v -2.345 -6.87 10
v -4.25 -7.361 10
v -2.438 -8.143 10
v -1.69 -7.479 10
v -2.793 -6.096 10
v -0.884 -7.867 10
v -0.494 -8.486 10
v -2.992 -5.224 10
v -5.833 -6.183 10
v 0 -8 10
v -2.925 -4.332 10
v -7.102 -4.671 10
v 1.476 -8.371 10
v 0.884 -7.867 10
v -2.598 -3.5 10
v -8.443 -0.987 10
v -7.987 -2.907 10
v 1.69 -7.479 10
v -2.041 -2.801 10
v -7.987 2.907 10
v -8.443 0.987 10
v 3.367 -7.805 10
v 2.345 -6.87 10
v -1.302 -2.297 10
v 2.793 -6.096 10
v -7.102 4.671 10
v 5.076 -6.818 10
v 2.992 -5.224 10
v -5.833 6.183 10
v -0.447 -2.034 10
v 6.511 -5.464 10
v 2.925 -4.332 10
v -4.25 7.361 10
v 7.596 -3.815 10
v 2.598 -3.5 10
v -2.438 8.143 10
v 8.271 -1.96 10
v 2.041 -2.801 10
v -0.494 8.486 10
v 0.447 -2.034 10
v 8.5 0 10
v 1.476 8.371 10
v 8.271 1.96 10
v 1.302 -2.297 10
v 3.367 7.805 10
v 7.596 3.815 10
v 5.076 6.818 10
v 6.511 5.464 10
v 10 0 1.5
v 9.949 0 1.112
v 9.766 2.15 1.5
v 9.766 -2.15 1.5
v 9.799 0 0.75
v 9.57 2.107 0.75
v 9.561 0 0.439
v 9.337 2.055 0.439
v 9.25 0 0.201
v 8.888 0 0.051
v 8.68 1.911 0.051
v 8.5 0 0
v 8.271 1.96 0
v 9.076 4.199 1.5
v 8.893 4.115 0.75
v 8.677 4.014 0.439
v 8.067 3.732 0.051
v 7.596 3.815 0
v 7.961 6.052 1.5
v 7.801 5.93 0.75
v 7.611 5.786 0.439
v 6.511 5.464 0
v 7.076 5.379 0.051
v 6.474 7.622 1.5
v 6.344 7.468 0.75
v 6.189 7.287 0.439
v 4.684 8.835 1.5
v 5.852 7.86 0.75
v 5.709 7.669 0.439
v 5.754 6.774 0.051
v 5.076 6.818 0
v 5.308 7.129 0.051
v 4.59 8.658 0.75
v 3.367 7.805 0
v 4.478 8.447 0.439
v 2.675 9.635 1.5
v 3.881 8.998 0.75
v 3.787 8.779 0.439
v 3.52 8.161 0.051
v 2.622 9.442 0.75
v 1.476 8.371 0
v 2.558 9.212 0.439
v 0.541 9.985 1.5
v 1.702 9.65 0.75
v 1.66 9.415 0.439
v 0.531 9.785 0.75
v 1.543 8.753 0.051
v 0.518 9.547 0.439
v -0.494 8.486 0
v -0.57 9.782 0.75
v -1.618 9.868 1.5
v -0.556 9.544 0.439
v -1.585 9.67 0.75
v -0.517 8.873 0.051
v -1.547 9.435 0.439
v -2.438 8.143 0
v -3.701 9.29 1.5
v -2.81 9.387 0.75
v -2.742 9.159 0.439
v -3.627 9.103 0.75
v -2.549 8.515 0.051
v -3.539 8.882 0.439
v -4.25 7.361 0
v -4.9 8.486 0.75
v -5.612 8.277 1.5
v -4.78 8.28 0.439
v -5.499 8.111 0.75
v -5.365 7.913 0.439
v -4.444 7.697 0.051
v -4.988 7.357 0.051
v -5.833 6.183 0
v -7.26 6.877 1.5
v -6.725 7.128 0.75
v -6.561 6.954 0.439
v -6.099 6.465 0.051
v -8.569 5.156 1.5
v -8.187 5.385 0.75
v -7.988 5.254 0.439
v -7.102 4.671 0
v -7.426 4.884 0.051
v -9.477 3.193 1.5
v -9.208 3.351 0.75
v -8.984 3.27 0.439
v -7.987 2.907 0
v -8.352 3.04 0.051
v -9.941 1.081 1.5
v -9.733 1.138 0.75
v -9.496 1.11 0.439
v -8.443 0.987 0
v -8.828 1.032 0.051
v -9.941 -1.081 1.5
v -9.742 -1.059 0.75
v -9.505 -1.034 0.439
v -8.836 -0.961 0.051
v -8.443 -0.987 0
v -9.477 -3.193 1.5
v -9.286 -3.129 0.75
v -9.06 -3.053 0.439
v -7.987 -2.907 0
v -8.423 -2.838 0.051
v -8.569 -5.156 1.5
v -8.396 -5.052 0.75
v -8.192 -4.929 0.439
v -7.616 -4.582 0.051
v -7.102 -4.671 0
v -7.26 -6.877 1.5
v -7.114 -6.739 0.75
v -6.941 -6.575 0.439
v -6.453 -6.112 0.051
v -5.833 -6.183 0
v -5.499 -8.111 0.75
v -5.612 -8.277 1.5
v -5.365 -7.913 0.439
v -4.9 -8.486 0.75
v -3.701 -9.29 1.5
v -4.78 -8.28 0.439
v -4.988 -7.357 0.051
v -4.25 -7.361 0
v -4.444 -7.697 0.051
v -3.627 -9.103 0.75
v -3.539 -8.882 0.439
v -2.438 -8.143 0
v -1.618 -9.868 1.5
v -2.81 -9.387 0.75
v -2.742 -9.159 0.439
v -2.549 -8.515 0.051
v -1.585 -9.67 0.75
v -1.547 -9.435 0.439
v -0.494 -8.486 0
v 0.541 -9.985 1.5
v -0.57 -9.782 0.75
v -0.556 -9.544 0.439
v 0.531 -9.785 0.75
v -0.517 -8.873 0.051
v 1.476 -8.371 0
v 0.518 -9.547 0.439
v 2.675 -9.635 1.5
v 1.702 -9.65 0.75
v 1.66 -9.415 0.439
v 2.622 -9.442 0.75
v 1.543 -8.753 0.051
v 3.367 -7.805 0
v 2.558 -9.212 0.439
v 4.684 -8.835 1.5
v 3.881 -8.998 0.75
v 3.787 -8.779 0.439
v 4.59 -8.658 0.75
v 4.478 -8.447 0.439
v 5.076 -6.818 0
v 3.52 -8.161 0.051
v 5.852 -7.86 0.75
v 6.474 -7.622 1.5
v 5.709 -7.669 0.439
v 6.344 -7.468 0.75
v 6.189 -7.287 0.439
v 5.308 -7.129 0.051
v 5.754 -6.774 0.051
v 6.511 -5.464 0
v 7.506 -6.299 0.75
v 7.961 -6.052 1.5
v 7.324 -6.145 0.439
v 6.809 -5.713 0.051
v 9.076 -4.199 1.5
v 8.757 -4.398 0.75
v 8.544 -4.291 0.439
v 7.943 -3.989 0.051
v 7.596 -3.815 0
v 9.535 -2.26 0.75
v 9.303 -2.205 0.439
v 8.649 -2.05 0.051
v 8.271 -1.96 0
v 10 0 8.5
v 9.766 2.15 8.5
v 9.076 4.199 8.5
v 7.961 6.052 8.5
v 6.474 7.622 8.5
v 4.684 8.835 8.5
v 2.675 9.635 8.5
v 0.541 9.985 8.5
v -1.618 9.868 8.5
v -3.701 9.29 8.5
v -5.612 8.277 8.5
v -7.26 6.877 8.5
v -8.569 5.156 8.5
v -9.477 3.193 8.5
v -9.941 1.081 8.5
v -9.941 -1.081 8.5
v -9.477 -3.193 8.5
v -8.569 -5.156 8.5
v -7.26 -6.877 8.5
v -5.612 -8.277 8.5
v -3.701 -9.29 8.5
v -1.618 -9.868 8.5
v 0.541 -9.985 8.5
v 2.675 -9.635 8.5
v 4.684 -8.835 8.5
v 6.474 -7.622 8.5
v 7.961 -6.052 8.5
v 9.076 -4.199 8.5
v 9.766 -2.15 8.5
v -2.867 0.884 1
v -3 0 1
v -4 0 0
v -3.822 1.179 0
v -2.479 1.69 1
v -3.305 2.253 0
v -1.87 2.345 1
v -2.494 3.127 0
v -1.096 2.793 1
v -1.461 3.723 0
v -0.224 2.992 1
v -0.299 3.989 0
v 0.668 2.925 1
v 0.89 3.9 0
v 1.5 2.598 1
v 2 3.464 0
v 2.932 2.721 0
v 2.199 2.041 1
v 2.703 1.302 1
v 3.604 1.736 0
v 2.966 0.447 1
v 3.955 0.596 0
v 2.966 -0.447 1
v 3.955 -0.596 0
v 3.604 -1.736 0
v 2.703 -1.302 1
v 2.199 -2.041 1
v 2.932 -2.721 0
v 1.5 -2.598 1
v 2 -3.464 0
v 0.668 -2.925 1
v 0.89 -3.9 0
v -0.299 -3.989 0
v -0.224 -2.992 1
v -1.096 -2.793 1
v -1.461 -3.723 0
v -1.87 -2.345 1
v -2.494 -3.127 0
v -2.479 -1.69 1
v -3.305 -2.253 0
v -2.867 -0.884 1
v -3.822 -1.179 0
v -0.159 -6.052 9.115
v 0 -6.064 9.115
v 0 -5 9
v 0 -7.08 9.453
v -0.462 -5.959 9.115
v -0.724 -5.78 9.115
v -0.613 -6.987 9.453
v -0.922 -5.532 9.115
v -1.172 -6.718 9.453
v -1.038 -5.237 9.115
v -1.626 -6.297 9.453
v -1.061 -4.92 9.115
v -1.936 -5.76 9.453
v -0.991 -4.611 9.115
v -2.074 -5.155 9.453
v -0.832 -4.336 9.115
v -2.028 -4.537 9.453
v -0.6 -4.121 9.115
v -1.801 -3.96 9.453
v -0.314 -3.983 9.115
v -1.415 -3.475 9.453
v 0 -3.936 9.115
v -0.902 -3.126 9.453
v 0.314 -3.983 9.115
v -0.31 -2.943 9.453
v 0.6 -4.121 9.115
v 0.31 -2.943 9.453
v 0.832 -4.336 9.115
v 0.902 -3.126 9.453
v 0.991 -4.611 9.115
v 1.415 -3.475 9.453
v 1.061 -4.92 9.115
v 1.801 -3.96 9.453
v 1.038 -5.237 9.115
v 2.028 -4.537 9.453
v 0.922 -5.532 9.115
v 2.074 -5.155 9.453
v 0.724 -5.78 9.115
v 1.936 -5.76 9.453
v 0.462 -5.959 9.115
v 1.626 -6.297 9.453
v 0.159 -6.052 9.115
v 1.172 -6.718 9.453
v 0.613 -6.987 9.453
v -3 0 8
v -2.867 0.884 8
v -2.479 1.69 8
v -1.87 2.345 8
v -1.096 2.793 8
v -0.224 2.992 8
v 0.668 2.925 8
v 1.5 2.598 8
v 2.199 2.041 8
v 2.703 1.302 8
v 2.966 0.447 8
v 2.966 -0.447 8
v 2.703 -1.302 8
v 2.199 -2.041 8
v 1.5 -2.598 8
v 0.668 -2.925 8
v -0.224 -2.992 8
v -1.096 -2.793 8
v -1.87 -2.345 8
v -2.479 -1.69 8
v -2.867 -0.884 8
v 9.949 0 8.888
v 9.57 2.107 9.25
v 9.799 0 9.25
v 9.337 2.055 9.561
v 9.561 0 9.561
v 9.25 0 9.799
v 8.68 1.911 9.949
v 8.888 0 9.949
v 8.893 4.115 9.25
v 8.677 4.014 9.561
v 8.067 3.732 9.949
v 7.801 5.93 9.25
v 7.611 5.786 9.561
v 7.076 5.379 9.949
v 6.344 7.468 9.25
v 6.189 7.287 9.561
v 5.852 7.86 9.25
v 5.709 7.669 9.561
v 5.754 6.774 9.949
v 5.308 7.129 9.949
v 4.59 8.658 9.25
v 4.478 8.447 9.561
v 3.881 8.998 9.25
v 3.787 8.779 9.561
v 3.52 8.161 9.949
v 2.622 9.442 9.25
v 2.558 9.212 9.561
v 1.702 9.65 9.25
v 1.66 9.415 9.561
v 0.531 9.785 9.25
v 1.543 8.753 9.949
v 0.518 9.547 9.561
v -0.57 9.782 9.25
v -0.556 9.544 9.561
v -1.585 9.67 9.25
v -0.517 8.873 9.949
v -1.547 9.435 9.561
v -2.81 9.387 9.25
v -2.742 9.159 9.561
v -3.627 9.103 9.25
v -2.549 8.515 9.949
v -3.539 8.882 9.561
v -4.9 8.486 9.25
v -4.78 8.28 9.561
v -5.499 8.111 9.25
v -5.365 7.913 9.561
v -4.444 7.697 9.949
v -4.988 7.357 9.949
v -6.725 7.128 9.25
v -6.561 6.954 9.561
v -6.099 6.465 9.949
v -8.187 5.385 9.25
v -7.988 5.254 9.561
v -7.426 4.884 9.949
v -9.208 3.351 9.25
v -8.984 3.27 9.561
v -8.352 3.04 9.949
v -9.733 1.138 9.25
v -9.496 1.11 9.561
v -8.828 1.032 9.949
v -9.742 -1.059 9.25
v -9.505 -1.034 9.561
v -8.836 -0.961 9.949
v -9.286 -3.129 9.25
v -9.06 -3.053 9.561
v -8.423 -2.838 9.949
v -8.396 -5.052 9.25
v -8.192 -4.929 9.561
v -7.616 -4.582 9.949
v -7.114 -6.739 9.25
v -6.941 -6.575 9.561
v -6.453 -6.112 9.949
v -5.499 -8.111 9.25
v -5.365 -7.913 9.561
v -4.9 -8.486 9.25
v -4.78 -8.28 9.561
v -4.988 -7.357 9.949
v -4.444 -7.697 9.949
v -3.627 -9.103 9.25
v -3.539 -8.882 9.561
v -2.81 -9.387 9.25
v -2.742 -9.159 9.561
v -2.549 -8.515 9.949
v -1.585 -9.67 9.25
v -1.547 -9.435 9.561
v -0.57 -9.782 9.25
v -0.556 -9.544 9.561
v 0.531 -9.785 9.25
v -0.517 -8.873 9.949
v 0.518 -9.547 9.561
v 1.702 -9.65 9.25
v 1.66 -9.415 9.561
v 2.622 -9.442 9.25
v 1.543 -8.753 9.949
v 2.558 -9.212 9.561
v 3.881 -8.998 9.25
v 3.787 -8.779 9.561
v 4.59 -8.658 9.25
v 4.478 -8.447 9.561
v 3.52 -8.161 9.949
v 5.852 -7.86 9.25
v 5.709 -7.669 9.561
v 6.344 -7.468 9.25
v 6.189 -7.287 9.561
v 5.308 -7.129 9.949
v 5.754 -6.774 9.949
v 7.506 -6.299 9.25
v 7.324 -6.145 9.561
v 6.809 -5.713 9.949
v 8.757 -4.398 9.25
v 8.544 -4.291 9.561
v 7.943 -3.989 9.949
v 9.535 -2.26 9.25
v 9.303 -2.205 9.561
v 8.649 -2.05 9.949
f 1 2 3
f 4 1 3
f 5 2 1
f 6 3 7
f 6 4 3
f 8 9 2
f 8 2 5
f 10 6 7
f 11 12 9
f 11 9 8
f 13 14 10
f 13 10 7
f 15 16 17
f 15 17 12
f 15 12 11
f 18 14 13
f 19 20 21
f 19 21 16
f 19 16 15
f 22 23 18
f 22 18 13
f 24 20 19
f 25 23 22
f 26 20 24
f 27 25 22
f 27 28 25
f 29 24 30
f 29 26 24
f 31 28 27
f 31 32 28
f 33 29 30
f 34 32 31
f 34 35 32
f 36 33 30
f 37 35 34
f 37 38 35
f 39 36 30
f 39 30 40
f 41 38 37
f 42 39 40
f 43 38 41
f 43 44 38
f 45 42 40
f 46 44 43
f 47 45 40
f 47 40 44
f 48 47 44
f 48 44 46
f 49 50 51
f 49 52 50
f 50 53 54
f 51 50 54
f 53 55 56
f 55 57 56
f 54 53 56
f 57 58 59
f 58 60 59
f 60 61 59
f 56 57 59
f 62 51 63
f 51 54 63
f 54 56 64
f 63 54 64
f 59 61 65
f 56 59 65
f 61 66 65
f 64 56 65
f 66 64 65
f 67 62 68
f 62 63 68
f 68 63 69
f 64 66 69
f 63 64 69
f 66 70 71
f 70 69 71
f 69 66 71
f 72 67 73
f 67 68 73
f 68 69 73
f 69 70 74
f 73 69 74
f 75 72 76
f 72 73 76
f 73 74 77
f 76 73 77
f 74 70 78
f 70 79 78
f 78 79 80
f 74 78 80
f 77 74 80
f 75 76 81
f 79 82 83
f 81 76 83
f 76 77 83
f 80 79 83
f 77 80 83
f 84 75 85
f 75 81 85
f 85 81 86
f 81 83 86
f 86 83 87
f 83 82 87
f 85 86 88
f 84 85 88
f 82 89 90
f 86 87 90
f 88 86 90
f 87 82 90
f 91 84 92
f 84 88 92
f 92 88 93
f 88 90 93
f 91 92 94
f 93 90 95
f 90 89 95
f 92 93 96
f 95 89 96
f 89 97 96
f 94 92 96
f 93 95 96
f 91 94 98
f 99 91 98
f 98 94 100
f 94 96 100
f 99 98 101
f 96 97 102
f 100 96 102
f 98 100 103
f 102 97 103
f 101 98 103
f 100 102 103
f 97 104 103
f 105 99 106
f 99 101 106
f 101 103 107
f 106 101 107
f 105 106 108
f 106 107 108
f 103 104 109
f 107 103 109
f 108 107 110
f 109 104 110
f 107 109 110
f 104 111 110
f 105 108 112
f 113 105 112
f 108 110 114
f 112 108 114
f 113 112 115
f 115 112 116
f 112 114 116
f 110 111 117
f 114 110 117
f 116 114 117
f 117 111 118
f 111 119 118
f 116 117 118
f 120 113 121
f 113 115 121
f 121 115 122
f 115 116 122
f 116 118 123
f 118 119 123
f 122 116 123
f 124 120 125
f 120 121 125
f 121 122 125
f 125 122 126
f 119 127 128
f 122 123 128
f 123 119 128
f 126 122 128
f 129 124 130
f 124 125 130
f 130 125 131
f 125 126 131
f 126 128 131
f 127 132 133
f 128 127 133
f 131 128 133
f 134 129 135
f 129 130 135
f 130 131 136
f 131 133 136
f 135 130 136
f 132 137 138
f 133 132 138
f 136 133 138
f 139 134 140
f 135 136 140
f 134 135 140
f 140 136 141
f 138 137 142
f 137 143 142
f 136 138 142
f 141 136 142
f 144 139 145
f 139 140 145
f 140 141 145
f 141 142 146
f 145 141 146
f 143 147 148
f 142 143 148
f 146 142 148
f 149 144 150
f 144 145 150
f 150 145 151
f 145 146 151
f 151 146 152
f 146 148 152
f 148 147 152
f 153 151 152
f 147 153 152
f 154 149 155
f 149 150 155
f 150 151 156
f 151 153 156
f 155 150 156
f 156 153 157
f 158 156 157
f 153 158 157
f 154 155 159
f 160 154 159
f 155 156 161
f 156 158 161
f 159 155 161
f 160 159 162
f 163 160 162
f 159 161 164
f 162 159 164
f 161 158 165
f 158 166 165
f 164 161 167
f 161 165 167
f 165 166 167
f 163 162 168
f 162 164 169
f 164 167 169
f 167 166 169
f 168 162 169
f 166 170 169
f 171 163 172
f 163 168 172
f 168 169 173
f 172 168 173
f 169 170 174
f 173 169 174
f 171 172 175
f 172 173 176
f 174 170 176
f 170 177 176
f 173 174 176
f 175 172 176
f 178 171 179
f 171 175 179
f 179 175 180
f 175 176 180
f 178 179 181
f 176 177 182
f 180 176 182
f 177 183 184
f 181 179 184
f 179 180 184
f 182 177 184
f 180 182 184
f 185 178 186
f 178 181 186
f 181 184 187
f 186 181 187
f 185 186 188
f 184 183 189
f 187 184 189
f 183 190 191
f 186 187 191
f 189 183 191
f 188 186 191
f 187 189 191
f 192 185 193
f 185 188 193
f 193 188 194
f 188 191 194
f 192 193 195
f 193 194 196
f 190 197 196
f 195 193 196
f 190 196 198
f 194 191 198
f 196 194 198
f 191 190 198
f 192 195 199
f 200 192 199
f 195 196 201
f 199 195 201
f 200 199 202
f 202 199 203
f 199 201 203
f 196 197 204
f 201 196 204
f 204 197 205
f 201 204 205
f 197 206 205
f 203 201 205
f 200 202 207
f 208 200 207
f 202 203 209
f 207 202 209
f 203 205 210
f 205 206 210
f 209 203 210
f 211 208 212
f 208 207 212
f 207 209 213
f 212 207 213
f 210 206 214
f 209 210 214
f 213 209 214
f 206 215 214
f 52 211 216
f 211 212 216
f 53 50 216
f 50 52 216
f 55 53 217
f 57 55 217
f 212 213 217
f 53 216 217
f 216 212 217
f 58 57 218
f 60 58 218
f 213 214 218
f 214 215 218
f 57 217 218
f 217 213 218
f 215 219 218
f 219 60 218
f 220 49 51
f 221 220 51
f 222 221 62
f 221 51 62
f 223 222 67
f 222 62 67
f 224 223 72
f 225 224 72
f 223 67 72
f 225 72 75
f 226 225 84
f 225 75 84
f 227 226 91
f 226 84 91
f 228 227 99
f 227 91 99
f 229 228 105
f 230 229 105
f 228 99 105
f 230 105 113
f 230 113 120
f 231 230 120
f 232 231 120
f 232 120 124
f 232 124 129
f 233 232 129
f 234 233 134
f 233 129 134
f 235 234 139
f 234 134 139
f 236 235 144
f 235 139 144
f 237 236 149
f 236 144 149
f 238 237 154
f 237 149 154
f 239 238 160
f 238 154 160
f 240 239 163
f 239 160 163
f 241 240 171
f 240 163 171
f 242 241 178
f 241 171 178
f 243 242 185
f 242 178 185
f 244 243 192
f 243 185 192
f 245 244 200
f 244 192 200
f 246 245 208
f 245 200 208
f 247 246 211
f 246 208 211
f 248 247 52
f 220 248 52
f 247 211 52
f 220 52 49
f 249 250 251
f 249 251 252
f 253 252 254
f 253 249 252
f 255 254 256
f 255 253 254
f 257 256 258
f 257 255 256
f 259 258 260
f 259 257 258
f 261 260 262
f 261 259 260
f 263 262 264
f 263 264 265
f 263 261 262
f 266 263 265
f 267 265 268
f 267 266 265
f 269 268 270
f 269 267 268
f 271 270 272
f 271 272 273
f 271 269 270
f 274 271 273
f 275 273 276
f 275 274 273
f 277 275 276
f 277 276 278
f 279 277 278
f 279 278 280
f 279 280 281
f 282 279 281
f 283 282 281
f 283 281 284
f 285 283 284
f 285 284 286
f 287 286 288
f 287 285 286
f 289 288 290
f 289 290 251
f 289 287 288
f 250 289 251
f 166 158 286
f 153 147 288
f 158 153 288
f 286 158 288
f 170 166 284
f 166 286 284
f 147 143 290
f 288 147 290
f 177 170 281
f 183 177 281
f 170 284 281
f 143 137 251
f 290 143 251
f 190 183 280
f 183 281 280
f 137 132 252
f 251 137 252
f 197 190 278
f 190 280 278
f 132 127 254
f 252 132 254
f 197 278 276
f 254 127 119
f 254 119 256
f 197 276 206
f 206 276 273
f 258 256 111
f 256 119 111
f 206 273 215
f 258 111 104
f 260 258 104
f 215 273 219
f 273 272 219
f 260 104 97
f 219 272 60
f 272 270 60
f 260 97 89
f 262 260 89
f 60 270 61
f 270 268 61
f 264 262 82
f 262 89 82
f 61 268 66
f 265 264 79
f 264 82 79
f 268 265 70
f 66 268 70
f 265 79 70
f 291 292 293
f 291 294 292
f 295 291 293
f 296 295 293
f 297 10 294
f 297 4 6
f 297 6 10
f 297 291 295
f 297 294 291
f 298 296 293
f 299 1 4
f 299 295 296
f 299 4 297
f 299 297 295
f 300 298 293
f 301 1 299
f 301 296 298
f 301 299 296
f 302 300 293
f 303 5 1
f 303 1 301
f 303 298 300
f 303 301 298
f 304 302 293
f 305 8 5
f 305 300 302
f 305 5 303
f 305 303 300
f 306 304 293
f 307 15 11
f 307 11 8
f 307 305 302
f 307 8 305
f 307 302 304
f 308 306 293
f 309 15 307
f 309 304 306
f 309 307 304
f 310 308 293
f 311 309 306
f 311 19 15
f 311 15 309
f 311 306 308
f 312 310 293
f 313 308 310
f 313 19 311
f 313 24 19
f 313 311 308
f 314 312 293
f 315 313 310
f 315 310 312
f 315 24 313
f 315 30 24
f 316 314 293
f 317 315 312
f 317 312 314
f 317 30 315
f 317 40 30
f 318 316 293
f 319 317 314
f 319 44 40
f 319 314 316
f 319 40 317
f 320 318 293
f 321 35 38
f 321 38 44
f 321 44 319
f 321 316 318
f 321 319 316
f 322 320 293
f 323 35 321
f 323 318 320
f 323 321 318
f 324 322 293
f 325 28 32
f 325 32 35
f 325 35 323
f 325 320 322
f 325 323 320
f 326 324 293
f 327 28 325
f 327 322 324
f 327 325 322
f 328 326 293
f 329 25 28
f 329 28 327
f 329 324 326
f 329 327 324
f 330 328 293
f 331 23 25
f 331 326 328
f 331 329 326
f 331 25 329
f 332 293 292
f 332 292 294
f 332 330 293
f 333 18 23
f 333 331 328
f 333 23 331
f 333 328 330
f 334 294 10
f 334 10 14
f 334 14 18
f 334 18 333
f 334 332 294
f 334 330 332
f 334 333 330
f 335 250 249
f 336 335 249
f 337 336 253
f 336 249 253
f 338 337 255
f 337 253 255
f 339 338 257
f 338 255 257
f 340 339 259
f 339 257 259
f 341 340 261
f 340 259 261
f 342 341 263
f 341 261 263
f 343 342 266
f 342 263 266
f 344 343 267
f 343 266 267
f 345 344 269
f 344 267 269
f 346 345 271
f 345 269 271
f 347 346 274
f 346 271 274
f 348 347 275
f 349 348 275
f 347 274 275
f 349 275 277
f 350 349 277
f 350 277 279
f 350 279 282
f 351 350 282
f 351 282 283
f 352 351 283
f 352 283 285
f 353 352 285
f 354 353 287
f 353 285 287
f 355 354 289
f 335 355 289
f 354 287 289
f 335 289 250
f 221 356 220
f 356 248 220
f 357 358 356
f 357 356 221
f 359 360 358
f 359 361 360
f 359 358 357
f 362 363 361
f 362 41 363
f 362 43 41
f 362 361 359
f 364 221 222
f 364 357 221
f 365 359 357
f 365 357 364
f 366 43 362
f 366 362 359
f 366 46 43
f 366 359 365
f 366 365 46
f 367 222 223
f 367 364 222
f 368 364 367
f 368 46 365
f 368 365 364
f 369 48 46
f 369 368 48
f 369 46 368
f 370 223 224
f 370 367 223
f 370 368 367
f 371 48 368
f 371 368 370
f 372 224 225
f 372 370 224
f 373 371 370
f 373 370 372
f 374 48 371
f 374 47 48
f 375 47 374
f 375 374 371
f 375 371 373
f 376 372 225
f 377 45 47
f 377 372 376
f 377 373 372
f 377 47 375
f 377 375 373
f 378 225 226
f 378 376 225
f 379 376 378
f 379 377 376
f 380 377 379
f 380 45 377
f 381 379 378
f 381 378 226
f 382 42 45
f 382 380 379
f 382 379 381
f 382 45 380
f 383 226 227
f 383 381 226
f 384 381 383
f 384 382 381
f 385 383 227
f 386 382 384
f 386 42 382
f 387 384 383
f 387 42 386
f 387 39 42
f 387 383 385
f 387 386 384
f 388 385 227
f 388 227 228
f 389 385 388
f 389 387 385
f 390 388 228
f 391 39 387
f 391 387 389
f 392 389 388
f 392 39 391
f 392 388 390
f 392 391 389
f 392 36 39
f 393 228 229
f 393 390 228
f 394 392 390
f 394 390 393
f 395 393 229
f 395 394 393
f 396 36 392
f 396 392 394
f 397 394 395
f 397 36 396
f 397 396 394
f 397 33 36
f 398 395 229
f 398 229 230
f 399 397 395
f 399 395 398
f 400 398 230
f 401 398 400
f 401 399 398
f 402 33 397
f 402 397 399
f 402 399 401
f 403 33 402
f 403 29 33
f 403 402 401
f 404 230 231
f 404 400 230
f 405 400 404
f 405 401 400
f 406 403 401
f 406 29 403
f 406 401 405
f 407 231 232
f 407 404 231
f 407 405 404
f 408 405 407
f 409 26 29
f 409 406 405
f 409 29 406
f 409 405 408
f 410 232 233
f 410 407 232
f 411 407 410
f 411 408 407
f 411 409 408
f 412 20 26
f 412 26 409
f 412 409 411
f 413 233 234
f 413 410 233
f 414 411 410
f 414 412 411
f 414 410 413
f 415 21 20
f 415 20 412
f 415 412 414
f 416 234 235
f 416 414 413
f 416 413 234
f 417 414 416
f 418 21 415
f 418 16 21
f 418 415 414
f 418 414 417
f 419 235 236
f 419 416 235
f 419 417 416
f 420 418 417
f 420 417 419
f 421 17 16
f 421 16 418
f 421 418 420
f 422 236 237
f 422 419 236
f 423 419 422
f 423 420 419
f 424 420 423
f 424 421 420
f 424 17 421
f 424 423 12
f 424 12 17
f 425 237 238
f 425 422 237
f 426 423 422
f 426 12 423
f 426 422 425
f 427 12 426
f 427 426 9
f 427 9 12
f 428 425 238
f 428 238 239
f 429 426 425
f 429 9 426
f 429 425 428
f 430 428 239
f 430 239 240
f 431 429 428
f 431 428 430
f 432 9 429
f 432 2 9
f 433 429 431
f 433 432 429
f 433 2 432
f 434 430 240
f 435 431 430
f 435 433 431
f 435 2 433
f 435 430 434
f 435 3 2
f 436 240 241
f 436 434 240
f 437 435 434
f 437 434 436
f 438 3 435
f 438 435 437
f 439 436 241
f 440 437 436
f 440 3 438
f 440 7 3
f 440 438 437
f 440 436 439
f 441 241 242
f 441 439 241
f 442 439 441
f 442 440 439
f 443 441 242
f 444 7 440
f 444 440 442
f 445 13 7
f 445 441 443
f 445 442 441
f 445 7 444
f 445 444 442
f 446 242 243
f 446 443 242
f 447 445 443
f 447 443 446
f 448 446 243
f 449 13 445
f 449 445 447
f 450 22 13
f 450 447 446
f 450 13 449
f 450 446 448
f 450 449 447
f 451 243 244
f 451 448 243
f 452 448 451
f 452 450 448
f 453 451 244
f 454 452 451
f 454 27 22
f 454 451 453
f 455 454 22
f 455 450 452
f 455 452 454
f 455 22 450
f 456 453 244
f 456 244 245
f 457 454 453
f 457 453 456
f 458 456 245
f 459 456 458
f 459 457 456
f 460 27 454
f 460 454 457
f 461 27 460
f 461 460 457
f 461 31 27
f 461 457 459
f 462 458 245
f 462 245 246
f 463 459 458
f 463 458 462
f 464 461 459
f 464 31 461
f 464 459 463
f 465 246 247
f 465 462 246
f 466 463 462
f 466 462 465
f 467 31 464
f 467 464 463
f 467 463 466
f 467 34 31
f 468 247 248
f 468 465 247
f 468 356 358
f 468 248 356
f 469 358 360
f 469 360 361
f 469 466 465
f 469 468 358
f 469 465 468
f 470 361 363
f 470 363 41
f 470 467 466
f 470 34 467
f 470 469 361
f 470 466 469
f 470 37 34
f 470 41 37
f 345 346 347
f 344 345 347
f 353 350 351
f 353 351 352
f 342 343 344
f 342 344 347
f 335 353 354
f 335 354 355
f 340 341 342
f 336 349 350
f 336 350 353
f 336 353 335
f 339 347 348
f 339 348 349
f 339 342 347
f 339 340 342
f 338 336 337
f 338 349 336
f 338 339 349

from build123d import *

# Parameters (mm, degrees)
SKETCH1_R           = 10
BOSS_EXTRUDE1_DEPTH = 10
FILLET1_R           = 1.5
SKETCH2_R           = 3
CUT_EXTRUDE1_DEPTH  = 8
CHAMFER1_SIZE       = 1


with BuildPart() as part:
    # Sketch1 → Boss-Extrude1 (new body)
    with BuildSketch(Plane.XY):
        Circle(SKETCH1_R)
    extrude(amount=BOSS_EXTRUDE1_DEPTH)

    # Fillet1
    fillet1_edges = [part.edges().sort_by_distance(p)[0] for p in [
        (-10, 0, 0),
        (-10, 0, 10),
    ]]
    fillet(fillet1_edges, radius=FILLET1_R)

    # Sketch2 → Cut-Extrude1 (cut)
    with BuildSketch(Plane(origin=(0, 0, 0), x_dir=(-1, 0, 0), z_dir=(0, 0, -1))):
        Circle(SKETCH2_R)
    extrude(amount=-CUT_EXTRUDE1_DEPTH, mode=Mode.SUBTRACT)

    # Chamfer1
    chamfer1_edges = [part.edges().sort_by_distance(p)[0] for p in [
        (3, 0, 0),
    ]]
    chamfer(chamfer1_edges, length=CHAMFER1_SIZE)

    # Sketch3 → Cut-Revolve2 (revolve, cut)
    with BuildSketch(Plane(origin=(0, 0, 0), x_dir=(0, 0, -1), z_dir=(1, 0, 0))):
        with BuildLine():
            Line((-19, -5), (-9, -5))
            ThreePointArc((-9, -5), (-14, -10), (-19, -5))
        make_face()
    revolve(axis=Axis((0, -5, 19), (0, 0, -1)), mode=Mode.SUBTRACT)


solid = part.part
